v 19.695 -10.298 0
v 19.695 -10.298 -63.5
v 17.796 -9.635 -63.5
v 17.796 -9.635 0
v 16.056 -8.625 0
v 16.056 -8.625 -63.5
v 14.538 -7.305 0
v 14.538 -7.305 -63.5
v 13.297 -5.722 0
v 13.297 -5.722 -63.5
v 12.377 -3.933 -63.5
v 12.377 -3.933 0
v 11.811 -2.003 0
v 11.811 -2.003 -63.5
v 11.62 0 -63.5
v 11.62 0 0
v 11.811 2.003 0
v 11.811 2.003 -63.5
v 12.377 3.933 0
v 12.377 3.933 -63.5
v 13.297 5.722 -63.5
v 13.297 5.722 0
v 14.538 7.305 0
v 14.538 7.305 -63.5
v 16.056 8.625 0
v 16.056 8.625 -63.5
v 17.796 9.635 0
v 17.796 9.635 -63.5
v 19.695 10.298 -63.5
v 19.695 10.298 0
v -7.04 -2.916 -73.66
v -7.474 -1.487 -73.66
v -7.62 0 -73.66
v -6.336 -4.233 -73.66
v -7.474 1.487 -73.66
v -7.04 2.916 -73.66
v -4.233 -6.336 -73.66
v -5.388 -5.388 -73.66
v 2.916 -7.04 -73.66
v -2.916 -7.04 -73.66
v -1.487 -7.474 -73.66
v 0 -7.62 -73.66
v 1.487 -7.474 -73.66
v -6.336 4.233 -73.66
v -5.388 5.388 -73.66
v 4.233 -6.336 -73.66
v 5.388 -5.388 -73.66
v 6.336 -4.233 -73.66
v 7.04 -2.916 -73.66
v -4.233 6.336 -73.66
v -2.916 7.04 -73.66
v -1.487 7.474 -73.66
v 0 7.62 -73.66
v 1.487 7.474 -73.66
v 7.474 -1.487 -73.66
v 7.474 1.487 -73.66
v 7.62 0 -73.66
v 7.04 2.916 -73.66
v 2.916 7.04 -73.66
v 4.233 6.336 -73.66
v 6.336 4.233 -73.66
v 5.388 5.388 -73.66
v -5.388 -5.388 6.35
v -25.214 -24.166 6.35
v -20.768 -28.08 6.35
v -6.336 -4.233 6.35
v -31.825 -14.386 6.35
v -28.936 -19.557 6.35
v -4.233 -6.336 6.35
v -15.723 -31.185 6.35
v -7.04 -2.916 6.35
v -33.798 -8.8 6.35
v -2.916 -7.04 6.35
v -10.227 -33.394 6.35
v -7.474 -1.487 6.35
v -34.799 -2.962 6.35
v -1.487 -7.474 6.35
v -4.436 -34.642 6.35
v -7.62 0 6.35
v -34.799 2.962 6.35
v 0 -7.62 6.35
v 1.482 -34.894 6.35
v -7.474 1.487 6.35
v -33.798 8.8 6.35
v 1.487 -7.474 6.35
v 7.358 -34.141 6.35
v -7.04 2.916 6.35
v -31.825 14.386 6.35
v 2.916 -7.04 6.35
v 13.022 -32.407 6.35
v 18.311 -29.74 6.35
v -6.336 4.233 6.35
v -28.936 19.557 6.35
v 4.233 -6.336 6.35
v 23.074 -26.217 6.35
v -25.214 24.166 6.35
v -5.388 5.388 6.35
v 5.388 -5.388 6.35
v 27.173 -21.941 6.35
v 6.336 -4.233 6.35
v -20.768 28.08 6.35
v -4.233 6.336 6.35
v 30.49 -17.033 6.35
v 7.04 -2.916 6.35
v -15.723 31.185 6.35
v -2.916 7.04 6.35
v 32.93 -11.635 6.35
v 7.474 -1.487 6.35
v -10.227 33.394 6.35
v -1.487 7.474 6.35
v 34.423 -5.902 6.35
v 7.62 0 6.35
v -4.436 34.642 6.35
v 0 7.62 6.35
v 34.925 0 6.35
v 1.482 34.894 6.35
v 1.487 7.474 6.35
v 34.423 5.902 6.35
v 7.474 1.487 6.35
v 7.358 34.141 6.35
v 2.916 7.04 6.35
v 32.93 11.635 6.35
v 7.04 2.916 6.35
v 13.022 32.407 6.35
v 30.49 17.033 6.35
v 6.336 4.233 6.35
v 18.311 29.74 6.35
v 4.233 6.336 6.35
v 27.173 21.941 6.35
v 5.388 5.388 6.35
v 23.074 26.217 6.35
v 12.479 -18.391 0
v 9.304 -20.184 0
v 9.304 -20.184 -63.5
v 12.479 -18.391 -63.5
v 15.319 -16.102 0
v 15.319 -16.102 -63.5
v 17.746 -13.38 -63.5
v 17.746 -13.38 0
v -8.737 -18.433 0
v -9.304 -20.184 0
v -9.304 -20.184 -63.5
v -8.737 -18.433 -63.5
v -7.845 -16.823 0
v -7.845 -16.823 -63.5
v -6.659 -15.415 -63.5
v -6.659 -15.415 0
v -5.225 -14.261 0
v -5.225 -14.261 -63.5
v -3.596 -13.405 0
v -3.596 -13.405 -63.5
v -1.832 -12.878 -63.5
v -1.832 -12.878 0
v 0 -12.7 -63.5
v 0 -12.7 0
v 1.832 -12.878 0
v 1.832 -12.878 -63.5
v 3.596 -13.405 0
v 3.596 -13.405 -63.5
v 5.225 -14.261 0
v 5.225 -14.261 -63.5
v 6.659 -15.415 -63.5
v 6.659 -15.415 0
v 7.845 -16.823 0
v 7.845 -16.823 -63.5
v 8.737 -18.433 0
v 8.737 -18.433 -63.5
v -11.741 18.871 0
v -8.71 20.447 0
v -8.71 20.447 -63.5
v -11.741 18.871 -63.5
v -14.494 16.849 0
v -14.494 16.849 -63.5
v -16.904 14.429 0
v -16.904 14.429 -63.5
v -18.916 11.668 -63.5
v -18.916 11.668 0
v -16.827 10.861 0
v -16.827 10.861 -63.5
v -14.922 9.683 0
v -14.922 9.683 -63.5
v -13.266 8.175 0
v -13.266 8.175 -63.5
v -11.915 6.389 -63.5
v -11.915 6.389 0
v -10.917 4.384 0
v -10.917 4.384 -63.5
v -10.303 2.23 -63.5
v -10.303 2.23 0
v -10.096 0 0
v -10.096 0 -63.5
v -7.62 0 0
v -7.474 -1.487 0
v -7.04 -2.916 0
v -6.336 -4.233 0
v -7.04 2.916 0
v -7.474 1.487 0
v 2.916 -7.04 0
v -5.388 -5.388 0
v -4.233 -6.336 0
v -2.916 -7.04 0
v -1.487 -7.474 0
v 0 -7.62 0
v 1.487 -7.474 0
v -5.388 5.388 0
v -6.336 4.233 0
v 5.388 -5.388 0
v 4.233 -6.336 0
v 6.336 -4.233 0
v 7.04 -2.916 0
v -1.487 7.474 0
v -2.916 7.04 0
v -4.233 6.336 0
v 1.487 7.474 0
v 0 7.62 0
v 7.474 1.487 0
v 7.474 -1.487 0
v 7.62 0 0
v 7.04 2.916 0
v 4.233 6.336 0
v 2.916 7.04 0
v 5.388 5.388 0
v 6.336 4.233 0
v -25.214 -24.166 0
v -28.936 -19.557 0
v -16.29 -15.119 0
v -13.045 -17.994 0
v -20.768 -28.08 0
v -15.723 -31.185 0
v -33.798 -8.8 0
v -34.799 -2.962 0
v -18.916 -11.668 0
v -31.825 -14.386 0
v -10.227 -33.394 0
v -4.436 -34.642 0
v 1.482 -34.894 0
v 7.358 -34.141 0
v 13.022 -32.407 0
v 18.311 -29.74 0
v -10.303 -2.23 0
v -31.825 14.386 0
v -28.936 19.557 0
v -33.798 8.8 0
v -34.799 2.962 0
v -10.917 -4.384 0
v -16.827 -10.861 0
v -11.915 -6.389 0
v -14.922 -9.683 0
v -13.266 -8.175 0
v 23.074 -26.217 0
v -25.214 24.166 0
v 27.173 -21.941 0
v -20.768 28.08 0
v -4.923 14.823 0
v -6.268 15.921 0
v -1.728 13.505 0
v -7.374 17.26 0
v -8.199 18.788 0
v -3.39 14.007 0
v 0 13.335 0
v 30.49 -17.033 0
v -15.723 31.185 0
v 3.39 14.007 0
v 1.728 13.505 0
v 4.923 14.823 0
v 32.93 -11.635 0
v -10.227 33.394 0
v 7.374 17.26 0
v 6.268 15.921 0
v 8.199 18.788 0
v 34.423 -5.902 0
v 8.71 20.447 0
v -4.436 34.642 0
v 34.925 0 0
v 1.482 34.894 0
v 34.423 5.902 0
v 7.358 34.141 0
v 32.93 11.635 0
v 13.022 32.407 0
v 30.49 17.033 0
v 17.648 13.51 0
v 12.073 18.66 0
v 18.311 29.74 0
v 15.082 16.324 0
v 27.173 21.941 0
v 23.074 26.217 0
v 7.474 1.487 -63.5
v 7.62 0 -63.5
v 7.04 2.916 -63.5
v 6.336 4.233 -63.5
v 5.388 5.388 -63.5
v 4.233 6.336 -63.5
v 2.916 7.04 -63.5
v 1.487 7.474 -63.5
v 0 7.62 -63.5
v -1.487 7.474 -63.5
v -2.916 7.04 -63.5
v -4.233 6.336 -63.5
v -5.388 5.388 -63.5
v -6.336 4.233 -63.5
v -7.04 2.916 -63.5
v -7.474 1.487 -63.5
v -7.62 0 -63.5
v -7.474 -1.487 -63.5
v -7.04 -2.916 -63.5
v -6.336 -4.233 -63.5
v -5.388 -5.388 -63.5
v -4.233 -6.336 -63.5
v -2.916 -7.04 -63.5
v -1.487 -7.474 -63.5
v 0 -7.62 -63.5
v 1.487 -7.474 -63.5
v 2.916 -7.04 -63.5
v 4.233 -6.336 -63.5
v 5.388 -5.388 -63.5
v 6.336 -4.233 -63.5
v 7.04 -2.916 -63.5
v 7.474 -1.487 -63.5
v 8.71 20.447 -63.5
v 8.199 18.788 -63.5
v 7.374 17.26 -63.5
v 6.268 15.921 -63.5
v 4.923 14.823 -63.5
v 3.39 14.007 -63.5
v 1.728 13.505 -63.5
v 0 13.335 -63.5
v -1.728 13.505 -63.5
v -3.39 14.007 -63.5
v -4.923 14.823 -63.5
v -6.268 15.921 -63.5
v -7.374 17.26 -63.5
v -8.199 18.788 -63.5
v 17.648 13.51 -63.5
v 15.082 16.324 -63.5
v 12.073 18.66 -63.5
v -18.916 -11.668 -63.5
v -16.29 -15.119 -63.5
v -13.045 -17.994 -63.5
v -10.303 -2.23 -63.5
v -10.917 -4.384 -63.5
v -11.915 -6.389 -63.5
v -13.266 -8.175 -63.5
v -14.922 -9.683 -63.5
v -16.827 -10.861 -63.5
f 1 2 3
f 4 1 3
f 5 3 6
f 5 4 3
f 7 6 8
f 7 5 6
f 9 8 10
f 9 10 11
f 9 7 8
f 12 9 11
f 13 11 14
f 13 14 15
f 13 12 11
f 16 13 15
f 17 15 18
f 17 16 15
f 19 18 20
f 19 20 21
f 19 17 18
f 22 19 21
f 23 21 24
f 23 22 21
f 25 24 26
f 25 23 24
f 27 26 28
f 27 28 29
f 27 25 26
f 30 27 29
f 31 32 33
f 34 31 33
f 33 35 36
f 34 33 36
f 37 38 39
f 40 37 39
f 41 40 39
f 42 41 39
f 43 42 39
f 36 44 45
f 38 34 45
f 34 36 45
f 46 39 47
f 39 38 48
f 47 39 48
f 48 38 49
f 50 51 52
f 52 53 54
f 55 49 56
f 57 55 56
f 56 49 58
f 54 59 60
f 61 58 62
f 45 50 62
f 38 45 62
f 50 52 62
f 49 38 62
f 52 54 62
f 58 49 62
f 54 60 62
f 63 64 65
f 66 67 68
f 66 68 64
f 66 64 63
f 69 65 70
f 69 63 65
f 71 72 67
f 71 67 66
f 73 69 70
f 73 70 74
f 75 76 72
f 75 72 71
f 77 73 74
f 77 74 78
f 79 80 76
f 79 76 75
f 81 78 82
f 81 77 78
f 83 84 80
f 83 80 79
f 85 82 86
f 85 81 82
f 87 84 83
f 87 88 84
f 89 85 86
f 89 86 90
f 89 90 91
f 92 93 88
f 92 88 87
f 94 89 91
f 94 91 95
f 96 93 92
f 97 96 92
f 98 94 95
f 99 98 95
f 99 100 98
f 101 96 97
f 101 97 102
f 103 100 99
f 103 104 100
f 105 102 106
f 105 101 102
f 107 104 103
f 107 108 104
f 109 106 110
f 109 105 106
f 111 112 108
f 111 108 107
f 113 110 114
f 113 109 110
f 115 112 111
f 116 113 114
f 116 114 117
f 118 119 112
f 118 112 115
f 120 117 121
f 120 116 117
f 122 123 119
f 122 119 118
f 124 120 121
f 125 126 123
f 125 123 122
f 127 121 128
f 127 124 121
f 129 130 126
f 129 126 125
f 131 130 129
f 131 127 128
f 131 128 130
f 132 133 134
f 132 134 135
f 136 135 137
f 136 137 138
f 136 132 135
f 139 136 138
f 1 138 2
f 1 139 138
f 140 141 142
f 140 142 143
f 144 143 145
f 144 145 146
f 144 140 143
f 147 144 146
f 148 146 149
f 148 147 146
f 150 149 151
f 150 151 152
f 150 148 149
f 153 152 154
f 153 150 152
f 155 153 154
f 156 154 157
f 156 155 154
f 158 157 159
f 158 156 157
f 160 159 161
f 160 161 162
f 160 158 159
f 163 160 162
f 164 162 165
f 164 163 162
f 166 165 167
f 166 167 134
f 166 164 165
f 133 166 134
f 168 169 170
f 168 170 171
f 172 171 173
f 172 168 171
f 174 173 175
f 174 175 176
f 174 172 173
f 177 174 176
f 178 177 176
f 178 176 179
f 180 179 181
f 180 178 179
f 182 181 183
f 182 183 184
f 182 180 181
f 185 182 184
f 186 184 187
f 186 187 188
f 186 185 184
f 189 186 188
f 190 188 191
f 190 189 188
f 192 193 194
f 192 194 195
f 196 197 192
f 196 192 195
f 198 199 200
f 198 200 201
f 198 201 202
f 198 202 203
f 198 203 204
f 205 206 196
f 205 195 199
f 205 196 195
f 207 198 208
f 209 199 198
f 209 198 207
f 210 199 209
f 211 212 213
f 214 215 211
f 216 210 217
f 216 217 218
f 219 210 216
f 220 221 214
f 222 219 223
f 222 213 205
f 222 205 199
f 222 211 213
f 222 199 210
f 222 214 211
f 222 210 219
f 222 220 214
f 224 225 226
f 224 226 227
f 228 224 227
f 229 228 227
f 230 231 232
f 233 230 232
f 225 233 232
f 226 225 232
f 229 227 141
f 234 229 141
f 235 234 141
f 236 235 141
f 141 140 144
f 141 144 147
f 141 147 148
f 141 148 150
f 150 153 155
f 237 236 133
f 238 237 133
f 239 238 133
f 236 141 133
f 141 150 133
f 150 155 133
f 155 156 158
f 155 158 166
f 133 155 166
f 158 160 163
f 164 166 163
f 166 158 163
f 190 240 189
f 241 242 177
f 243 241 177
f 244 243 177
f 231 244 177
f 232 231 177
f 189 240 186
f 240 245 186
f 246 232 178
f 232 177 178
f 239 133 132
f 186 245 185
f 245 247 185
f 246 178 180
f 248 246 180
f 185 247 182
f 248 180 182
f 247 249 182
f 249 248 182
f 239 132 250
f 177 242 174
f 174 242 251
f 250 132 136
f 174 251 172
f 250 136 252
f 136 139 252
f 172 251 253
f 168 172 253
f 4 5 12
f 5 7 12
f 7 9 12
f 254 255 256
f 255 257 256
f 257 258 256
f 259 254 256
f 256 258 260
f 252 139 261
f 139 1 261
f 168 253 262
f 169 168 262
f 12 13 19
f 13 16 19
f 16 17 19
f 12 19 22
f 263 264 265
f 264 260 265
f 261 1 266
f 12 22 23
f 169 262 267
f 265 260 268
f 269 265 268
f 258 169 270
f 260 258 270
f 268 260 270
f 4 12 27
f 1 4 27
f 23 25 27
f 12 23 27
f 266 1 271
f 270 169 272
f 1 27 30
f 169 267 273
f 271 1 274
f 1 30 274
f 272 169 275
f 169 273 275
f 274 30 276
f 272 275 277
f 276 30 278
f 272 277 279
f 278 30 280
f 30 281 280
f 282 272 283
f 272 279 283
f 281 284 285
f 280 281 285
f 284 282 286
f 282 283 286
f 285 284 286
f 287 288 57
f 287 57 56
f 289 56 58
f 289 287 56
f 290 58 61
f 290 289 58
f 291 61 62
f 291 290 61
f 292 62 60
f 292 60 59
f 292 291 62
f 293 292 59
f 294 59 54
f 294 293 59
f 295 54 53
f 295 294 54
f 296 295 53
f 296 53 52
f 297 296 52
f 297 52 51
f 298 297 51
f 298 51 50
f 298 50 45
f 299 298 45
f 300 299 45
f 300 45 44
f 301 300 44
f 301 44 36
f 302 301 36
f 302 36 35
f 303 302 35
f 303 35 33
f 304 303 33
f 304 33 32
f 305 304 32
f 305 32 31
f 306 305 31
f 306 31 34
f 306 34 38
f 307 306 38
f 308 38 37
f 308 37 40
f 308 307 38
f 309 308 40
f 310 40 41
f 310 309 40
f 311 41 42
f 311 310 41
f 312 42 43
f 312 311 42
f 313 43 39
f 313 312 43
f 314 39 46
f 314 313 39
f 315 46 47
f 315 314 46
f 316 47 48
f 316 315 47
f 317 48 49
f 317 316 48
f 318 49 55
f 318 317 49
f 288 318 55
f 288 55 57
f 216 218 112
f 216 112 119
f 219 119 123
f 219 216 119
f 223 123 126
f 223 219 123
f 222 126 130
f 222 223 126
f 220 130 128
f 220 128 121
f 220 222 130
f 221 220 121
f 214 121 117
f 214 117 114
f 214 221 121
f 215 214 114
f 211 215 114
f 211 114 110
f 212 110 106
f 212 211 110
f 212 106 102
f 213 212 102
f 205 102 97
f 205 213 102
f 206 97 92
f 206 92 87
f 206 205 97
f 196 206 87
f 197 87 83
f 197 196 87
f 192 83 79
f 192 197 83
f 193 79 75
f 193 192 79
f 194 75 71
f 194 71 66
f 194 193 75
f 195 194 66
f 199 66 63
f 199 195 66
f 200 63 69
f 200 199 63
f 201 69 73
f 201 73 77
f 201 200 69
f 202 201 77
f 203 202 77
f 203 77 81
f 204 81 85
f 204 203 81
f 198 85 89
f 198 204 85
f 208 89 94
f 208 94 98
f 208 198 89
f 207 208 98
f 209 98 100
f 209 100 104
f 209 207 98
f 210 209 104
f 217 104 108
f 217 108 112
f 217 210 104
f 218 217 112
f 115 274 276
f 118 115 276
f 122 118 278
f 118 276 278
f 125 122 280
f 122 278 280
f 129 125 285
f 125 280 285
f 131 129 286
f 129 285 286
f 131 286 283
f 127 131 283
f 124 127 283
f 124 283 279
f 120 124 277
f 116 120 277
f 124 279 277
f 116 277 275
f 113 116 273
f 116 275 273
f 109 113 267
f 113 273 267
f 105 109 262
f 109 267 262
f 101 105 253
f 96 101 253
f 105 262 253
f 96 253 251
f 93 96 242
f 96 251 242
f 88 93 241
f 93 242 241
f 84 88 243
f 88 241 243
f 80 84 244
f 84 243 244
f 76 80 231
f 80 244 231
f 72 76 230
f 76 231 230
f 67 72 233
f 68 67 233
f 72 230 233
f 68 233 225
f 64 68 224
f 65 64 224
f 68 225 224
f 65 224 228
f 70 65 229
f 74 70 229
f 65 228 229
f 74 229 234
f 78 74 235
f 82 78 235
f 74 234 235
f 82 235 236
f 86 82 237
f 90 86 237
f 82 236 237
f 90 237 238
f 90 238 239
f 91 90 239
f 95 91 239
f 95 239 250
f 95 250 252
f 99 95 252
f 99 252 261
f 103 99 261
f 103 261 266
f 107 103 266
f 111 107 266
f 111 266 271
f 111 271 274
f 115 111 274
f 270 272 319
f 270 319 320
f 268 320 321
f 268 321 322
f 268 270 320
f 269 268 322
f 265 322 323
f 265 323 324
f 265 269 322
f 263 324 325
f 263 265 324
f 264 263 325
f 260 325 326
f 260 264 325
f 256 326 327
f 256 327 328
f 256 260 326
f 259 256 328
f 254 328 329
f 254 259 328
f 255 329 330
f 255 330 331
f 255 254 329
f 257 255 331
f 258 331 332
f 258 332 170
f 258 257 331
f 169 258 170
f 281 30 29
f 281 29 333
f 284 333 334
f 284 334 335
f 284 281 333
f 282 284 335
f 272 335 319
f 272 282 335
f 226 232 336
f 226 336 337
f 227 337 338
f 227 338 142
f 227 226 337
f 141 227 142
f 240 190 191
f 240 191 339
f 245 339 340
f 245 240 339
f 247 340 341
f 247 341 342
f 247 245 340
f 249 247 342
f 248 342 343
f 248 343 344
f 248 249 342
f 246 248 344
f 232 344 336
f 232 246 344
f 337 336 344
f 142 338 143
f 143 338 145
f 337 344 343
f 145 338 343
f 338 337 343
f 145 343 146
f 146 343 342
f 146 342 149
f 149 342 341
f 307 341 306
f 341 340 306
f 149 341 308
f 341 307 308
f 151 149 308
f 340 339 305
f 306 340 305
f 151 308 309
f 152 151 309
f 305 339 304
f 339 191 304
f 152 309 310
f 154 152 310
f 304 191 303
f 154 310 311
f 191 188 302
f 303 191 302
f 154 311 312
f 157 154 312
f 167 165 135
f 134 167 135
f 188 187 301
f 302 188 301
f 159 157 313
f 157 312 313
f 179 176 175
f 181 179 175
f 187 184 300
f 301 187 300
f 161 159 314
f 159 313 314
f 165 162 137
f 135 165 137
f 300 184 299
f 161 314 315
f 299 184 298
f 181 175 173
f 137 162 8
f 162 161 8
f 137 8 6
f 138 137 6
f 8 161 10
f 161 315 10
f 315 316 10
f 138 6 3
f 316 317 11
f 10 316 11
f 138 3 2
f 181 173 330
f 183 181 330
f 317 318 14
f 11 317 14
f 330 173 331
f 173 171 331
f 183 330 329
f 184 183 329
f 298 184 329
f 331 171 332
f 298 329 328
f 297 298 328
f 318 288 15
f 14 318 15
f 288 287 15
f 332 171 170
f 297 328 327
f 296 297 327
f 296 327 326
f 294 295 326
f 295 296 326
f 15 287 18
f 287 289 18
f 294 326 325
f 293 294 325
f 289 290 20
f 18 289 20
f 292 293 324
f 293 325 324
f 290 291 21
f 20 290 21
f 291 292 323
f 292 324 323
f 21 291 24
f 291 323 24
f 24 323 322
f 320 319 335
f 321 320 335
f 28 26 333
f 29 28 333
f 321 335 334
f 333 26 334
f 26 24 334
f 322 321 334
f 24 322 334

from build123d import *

# Parameters (mm, degrees)
F0_R     = 7.62
F1_DEPTH = 63.5
F0_R_2   = 34.925
F3_DEPTH = 6.35
F4_DEPTH = 73.66


# Not quite as in the source:
# - the program builds the solid bodies; features that only make, move or delete a surface that nothing else refers to are left out


with BuildPart() as f1:
    # F0 (on Top) → F1 (new body)
    with BuildSketch(Plane.XY):
        with BuildLine():
            ThreePointArc((19.6950692857, -10.2982945593), (11.6205, 0), (19.6950692857, 10.2982945593))
            ThreePointArc((19.6950692857, 10.2982945593), (15.0819932796, 16.3243408355), (8.7103855253, 20.447))
            ThreePointArc((8.7103855253, 20.447), (0, 13.335), (-8.7103855253, 20.447))
            ThreePointArc((-8.7103855253, 20.447), (-14.4936529558, 16.8488767874), (-18.9156521429, 11.668278751))
            ThreePointArc((-18.9156521429, 11.668278751), (-12.549310419, 7.3131076419), (-10.0965, 0))
            ThreePointArc((-10.0965, 0), (-12.549310419, -7.3131076419), (-18.9156521429, -11.668278751))
            ThreePointArc((-18.9156521429, -11.668278751), (-14.738135996, -16.6354432572), (-9.3037440003, -20.1839285714))
            ThreePointArc((-9.3037440003, -20.1839285714), (0, -12.7), (9.3037440003, -20.1839285714))
            ThreePointArc((9.3037440003, -20.1839285714), (15.3187542886, -16.102372249), (19.6950692857, -10.2982945593))
        make_face()
        Circle(F0_R, mode=Mode.SUBTRACT)
    extrude(amount=-F1_DEPTH)

    # F0 (on Top) → F3 (join)
    with BuildSketch(Plane.XY):
        Circle(F0_R_2)
        with BuildLine():
            ThreePointArc((8.7103855253, 20.447), (15.0819932796, 16.3243408355), (19.6950692857, 10.2982945593))
            ThreePointArc((19.6950692857, 10.2982945593), (28.7681937917, 8.3451803608), (32.8295, 0))
            ThreePointArc((32.8295, 0), (28.7681937917, -8.3451803608), (19.6950692857, -10.2982945593))
            ThreePointArc((19.6950692857, -10.2982945593), (15.3187542886, -16.102372249), (9.3037440003, -20.1839285714))
            ThreePointArc((9.3037440003, -20.1839285714), (9.4695244496, -21.198485656), (9.525, -22.225))
            ThreePointArc((9.525, -22.225), (-1.026514344, -31.6945244496), (-9.3037440003, -20.1839285714))
            ThreePointArc((-9.3037440003, -20.1839285714), (-14.738135996, -16.6354432572), (-18.9156521429, -11.668278751))
            ThreePointArc((-18.9156521429, -11.668278751), (-34.3535, 0), (-18.9156521429, 11.668278751))
            ThreePointArc((-18.9156521429, 11.668278751), (-14.4936529558, 16.8488767874), (-8.7103855253, 20.447))
            ThreePointArc((-8.7103855253, 20.447), (-0.8935246722, 31.0699824002), (8.89, 22.225))
            ThreePointArc((8.89, 22.225), (8.8449824002, 21.3314753278), (8.7103855253, 20.447))
        make_face(mode=Mode.SUBTRACT)
        with BuildLine():
            ThreePointArc((19.6950692857, -10.2982945593), (11.6205, 0), (19.6950692857, 10.2982945593))
            ThreePointArc((19.6950692857, 10.2982945593), (15.0819932796, 16.3243408355), (8.7103855253, 20.447))
            ThreePointArc((8.7103855253, 20.447), (0, 13.335), (-8.7103855253, 20.447))
            ThreePointArc((-8.7103855253, 20.447), (-14.4936529558, 16.8488767874), (-18.9156521429, 11.668278751))
            ThreePointArc((-18.9156521429, 11.668278751), (-12.549310419, 7.3131076419), (-10.0965, 0))
            ThreePointArc((-10.0965, 0), (-12.549310419, -7.3131076419), (-18.9156521429, -11.668278751))
            ThreePointArc((-18.9156521429, -11.668278751), (-14.738135996, -16.6354432572), (-9.3037440003, -20.1839285714))
            ThreePointArc((-9.3037440003, -20.1839285714), (0, -12.7), (9.3037440003, -20.1839285714))
            ThreePointArc((9.3037440003, -20.1839285714), (15.3187542886, -16.102372249), (19.6950692857, -10.2982945593))
        make_face()
        Circle(F0_R, mode=Mode.SUBTRACT)
        with BuildLine():
            ThreePointArc((-8.7103855253, 20.447), (0, 13.335), (8.7103855253, 20.447))
            ThreePointArc((8.7103855253, 20.447), (0, 22.225), (-8.7103855253, 20.447))
        make_face()
        with BuildLine():
            ThreePointArc((-8.7103855253, 20.447), (0, 22.225), (8.7103855253, 20.447))
            ThreePointArc((8.7103855253, 20.447), (8.8449824002, 21.3314753278), (8.89, 22.225))
            ThreePointArc((8.89, 22.225), (-0.8935246722, 31.0699824002), (-8.7103855253, 20.447))
        make_face()
        with BuildLine():
            ThreePointArc((19.6950692857, -10.2982945593), (21.5832520705, -5.30225), (22.225, 0))
            ThreePointArc((22.225, 0), (21.5832520705, 5.30225), (19.6950692857, 10.2982945593))
            ThreePointArc((19.6950692857, 10.2982945593), (11.6205, 0), (19.6950692857, -10.2982945593))
        make_face()
        with BuildLine():
            ThreePointArc((19.6950692857, 10.2982945593), (21.5832520705, 5.30225), (22.225, 0))
            ThreePointArc((22.225, 0), (21.5832520705, -5.30225), (19.6950692857, -10.2982945593))
            ThreePointArc((19.6950692857, -10.2982945593), (28.7681937917, -8.3451803608), (32.8295, 0))
            ThreePointArc((32.8295, 0), (28.7681937917, 8.3451803608), (19.6950692857, 10.2982945593))
        make_face()
        with BuildLine():
            ThreePointArc((-18.9156521429, -11.668278751), (-22.225, 0), (-18.9156521429, 11.668278751))
            ThreePointArc((-18.9156521429, 11.668278751), (-34.3535, 0), (-18.9156521429, -11.668278751))
        make_face()
        with BuildLine():
            ThreePointArc((-10.0965, 0), (-12.549310419, 7.3131076419), (-18.9156521429, 11.668278751))
            ThreePointArc((-18.9156521429, 11.668278751), (-22.225, 0), (-18.9156521429, -11.668278751))
            ThreePointArc((-18.9156521429, -11.668278751), (-12.549310419, -7.3131076419), (-10.0965, 0))
        make_face()
        with BuildLine():
            ThreePointArc((9.525, -22.225), (9.4695244496, -21.198485656), (9.3037440003, -20.1839285714))
            ThreePointArc((9.3037440003, -20.1839285714), (0, -22.225), (-9.3037440003, -20.1839285714))
            ThreePointArc((-9.3037440003, -20.1839285714), (-1.026514344, -31.6945244496), (9.525, -22.225))
        make_face()
        with BuildLine():
            ThreePointArc((-9.3037440003, -20.1839285714), (0, -22.225), (9.3037440003, -20.1839285714))
            ThreePointArc((9.3037440003, -20.1839285714), (0, -12.7), (-9.3037440003, -20.1839285714))
        make_face()
    extrude(amount=F3_DEPTH)

    # F0 (on Top) → F4 (join)
    with BuildSketch(Plane.XY):
        Circle(F0_R)
    extrude(amount=-F4_DEPTH)


solid = f1.part
